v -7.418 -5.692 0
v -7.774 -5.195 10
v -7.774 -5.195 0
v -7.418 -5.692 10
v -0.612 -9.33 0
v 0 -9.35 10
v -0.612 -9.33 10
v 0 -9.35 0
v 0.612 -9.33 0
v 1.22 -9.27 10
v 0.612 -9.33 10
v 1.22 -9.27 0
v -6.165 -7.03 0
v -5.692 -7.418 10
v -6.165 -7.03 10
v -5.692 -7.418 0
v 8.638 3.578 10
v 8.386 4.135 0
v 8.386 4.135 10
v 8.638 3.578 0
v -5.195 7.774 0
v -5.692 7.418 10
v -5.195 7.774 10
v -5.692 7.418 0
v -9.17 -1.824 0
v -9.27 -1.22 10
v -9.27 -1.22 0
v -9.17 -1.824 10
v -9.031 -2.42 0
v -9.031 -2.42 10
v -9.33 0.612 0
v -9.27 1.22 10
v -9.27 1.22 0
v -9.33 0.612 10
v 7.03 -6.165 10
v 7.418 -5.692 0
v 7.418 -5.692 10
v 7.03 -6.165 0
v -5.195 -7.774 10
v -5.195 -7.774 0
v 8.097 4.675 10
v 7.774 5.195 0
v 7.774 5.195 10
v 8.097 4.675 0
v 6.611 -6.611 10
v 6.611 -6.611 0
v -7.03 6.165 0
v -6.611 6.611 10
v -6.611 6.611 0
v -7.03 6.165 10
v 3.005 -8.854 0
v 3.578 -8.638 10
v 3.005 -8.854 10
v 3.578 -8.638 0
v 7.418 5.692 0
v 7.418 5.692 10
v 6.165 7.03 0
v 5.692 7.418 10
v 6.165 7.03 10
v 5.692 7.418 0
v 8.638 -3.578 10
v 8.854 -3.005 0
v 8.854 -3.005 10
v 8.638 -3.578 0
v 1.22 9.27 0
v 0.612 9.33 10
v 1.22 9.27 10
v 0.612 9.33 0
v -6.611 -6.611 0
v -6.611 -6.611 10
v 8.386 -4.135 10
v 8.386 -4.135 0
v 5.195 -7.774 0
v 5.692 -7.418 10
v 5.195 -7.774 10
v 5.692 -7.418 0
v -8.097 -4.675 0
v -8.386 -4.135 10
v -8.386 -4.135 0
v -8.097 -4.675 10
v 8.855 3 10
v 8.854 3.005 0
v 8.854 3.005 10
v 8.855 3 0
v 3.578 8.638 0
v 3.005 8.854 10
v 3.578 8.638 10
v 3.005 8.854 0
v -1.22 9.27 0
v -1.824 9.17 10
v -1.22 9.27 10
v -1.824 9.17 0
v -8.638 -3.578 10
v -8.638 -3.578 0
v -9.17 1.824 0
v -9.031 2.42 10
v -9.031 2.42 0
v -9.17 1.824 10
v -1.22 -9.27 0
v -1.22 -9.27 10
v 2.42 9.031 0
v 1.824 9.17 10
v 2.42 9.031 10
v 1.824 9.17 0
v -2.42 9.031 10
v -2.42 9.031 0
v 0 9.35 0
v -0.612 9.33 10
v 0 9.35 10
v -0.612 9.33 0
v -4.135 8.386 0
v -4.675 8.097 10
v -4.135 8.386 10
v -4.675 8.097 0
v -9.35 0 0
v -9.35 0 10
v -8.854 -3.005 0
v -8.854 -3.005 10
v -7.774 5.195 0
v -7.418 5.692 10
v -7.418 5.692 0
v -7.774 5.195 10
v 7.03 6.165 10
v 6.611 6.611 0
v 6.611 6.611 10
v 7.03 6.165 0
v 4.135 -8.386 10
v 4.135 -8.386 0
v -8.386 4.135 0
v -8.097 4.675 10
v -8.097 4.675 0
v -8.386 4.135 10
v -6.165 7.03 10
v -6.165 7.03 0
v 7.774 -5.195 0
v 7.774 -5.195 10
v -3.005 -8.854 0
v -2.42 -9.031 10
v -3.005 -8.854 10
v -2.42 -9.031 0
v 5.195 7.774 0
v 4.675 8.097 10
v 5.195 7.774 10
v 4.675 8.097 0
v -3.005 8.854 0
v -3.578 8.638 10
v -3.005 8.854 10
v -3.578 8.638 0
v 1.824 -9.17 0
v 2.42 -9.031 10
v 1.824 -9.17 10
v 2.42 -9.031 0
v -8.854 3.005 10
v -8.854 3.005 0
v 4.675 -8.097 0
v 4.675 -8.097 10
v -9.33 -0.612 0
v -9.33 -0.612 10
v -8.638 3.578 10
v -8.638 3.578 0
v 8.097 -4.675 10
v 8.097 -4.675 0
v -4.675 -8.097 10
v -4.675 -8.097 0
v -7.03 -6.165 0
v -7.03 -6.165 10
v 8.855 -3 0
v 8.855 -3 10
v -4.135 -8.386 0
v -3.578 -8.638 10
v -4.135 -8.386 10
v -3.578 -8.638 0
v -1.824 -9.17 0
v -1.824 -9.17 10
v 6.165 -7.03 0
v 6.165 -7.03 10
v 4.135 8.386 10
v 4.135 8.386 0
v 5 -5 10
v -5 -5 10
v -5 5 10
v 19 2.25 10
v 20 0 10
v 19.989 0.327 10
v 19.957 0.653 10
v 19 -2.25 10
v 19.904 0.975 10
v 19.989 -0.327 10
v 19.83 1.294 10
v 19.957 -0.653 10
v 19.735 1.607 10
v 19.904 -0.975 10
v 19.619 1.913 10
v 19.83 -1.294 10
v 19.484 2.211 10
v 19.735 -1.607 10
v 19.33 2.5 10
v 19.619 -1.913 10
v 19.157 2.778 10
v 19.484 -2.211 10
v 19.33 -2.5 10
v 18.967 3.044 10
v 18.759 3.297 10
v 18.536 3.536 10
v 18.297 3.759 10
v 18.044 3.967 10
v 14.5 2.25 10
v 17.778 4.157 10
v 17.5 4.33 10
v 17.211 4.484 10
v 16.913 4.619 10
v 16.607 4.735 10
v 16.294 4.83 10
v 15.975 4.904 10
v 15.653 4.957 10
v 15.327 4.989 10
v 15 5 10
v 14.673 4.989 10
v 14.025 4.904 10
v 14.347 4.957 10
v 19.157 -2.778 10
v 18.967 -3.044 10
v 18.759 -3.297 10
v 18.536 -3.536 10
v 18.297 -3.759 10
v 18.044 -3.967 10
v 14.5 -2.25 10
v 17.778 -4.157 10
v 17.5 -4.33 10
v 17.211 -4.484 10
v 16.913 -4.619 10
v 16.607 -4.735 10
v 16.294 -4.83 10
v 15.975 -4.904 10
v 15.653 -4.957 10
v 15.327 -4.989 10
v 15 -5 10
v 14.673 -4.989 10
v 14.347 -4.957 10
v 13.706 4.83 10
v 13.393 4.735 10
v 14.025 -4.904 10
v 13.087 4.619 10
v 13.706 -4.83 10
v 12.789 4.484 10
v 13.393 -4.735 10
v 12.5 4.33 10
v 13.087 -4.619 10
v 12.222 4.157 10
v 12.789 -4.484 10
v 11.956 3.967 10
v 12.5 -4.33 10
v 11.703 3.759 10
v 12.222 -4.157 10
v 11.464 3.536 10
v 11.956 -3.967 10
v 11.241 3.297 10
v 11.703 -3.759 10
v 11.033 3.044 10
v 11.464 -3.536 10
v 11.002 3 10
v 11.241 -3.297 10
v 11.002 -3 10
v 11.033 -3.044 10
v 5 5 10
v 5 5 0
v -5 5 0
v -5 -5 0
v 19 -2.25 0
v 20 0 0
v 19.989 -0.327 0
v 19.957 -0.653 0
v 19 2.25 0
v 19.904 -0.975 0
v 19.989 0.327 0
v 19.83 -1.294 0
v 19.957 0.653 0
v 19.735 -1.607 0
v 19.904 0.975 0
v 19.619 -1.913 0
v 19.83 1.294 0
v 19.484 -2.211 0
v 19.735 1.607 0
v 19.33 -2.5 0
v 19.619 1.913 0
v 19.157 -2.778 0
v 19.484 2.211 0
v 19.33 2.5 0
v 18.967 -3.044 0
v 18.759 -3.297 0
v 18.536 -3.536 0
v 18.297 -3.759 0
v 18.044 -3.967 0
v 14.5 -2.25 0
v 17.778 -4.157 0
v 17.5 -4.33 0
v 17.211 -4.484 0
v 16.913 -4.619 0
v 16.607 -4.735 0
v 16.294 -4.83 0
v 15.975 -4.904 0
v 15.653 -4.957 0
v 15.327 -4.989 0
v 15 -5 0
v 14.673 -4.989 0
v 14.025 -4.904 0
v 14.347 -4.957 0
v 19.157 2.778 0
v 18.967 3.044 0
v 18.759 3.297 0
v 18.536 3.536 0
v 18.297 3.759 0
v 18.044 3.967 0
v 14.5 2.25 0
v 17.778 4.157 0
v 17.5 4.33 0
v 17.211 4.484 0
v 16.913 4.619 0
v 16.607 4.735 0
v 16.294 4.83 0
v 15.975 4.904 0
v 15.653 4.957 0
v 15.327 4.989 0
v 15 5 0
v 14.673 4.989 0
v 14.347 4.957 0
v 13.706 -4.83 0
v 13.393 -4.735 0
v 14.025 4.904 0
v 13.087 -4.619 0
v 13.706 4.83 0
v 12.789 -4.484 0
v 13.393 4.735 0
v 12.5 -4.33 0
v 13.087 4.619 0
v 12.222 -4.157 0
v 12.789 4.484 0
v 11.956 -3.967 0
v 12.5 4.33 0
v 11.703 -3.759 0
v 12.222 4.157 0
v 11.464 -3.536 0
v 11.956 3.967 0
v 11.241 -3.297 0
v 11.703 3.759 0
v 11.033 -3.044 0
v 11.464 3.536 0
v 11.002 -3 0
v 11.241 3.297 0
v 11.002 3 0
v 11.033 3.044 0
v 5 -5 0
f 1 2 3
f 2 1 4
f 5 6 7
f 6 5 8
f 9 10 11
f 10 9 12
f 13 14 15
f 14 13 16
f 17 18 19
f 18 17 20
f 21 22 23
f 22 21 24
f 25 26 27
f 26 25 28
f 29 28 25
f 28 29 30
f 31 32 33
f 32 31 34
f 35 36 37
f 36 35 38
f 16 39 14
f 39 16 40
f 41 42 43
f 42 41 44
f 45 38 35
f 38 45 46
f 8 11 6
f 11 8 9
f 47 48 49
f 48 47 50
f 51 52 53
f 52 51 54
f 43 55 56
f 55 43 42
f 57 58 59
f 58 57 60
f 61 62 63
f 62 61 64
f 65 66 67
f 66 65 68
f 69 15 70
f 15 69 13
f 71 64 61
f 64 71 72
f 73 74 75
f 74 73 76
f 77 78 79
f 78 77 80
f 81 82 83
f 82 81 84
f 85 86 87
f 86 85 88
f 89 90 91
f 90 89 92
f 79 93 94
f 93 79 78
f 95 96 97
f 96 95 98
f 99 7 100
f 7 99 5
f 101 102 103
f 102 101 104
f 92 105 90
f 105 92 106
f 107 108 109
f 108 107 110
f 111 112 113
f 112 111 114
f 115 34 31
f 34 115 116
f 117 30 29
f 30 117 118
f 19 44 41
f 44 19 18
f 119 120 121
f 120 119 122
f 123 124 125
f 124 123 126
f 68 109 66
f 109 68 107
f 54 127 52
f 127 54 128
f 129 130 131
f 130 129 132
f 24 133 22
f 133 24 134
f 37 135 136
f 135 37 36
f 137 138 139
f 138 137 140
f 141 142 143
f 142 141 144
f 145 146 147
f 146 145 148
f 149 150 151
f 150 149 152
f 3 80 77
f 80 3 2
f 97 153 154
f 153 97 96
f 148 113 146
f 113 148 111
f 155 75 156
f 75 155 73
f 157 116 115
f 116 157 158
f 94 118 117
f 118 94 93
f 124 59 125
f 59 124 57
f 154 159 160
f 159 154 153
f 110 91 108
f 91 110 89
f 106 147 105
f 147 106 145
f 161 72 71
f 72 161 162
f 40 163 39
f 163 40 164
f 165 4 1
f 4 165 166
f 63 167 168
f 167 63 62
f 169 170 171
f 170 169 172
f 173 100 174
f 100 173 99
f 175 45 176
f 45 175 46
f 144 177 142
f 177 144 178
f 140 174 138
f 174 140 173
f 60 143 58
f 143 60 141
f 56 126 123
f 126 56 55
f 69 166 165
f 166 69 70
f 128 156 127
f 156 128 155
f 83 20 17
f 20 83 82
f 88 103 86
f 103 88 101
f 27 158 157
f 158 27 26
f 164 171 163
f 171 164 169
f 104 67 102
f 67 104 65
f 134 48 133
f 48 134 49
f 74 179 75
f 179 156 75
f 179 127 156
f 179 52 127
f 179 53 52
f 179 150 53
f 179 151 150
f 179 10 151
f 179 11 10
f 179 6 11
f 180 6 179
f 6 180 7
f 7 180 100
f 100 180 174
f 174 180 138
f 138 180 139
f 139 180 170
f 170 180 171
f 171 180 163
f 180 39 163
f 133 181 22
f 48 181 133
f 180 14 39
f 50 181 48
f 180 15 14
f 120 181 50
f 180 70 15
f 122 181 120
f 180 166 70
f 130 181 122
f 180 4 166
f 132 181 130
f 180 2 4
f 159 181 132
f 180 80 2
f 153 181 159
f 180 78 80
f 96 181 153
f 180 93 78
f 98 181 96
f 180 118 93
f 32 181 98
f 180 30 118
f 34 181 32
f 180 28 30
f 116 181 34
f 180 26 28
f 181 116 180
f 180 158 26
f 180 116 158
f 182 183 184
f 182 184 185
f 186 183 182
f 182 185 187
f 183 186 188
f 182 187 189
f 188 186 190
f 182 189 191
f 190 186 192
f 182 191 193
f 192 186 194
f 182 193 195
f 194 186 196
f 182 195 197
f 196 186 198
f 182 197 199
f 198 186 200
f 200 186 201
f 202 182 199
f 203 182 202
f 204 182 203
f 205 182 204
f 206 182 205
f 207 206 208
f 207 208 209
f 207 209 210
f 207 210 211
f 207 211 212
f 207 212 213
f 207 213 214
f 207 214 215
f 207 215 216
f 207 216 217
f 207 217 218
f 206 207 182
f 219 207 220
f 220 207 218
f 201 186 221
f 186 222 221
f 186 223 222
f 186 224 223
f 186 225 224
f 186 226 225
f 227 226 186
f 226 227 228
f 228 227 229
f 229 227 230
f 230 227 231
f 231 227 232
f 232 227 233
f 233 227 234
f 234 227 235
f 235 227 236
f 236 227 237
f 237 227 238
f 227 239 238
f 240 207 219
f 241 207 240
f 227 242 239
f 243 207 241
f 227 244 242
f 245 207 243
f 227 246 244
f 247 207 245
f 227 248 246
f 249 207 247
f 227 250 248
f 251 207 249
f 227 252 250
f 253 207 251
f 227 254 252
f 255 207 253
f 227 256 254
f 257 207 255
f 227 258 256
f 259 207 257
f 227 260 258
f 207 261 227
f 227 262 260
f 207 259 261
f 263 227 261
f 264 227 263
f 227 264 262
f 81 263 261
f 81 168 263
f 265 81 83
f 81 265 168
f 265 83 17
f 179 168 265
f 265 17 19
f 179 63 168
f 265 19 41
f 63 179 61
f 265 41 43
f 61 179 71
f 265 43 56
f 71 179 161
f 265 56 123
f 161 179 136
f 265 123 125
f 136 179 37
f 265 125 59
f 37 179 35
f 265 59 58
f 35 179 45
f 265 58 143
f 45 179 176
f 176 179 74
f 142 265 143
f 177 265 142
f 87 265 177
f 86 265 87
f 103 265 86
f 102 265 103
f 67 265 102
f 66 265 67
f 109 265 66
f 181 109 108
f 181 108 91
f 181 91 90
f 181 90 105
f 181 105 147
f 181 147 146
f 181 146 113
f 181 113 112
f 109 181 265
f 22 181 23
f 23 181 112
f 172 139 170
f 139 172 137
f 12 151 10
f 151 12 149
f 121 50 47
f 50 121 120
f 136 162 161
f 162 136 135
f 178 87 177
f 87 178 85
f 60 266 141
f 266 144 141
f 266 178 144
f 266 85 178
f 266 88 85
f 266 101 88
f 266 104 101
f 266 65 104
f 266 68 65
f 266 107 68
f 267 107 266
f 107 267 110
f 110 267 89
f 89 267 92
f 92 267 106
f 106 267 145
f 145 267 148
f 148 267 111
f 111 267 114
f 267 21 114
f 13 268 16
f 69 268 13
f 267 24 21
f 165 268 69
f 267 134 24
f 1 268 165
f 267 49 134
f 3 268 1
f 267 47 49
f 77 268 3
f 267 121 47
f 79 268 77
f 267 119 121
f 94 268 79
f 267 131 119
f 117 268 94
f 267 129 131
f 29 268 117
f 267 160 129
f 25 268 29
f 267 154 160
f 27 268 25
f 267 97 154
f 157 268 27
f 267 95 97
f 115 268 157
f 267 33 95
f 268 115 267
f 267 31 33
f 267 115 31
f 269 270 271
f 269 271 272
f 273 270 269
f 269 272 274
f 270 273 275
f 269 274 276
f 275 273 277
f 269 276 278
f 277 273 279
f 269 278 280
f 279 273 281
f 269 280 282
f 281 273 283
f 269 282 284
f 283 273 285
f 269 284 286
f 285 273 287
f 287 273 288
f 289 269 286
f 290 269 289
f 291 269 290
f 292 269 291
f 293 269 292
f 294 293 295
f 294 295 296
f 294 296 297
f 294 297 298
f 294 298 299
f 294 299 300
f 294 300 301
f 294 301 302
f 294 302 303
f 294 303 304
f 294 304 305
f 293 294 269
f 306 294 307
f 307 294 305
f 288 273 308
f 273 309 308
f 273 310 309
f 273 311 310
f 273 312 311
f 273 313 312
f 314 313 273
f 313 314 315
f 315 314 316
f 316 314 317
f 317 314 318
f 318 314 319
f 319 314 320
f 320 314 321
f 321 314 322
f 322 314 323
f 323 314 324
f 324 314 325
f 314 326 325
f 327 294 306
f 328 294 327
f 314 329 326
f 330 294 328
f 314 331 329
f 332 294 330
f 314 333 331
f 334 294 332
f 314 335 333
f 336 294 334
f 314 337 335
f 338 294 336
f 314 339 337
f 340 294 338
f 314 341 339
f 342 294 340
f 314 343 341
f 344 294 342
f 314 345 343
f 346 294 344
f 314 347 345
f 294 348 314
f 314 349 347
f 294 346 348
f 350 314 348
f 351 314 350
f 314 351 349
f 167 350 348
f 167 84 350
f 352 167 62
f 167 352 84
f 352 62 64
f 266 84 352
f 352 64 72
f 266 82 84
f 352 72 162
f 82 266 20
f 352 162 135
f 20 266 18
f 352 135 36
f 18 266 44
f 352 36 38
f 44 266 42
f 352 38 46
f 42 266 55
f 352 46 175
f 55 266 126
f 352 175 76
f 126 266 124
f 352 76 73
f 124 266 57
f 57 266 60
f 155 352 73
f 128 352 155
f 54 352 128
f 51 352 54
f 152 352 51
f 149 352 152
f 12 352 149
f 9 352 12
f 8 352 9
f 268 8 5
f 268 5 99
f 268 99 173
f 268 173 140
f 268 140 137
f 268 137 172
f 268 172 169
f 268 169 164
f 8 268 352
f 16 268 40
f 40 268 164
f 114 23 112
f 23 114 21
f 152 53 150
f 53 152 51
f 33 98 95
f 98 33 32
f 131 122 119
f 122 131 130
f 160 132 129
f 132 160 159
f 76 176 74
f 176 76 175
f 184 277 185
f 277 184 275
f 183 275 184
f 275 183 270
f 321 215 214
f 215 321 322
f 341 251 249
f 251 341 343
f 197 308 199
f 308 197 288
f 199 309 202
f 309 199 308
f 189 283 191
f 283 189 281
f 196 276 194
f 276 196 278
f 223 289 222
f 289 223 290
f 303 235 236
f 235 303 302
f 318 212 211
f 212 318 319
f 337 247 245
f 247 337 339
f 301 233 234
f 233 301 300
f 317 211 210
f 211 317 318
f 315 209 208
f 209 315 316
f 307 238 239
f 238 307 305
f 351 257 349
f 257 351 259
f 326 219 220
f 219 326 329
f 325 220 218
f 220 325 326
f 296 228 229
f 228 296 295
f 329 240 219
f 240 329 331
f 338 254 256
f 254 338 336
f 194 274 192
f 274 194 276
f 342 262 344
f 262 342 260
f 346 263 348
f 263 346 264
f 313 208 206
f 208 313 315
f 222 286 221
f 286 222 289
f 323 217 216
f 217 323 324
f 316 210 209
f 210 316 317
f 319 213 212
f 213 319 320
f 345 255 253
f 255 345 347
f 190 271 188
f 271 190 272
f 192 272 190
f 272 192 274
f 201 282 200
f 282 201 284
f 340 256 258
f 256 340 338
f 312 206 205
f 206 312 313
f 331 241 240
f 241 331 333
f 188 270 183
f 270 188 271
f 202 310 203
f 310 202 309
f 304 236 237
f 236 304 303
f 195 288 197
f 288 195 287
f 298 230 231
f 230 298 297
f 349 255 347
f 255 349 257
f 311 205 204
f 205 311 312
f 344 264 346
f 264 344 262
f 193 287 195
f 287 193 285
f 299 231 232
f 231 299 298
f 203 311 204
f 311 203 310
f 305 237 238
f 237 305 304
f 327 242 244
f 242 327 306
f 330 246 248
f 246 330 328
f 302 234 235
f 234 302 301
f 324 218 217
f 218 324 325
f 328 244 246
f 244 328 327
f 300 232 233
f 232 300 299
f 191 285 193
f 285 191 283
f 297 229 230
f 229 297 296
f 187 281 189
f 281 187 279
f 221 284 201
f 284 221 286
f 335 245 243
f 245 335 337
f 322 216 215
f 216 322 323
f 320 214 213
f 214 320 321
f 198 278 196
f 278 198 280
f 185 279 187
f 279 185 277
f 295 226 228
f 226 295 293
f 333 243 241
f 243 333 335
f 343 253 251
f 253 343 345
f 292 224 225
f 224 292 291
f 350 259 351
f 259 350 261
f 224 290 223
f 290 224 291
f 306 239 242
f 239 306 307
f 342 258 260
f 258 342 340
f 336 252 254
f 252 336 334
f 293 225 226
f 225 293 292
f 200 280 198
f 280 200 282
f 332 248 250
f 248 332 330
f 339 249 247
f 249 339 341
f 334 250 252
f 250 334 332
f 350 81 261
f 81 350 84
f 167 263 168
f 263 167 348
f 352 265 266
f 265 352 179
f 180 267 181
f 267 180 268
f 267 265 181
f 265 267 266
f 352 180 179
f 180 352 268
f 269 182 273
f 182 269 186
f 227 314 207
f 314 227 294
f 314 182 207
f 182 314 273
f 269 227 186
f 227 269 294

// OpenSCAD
// Tubing clip for 12.7 mm (1/2 inch) lab stand rod
// Print orientation: flat, extruded along Z (z = 0 to 10)

// ---------------- Parameters ----------------
extrusion_height   = 10;   // Z height of the part (mm)
rod_d              = 12.7; // stand rod inner diameter (mm)
rod_wall           = 3;    // stand rod ring wall thickness (mm)
rod_opening_w      = 10;   // width of the -X side opening (mm)

tubing_d           = 6;    // tubing inner diameter (mm)
tubing_wall        = 2;    // tubing ring wall thickness (mm)
tubing_opening_w   = 4.5;  // width of the +X side opening (mm)

bridge_w           = 6;    // bridge width in Y (mm)
bridge_x_start     = 8;    // bridge start in X (mm)
bridge_x_end       = 12;   // bridge end in X (mm)

eps                = 0.5;  // cutter overshoot past faces (mm)
$fn                = 96;   // circle resolution

// ---------------- Derived ----------------
rod_outer = rod_d + 2 * rod_wall;                 // 18.7 mm
tubing_outer = tubing_d + 2 * tubing_wall;        // 10 mm
tubing_opening_half = tubing_opening_w / 2;       // 2.25 mm

// ---------------- Model ----------------
difference() {
    union() {
        // Rod ring
        cylinder(h = extrusion_height,
                  d = rod_outer,
                  $fn = $fn);
        // Tubing ring
        translate([15, 0, 0])
            cylinder(h = extrusion_height,
                     d = tubing_outer,
                     $fn = $fn);
        // Solid bridge
        translate([bridge_x_start, -bridge_w / 2, 0])
            cube([bridge_x_end - bridge_x_start, bridge_w, extrusion_height]);
    }

    // Opening in rod ring: x < 0 and -5 < y < 5
    translate([-rod_opening_w / 2, -5, -eps])
        cube([rod_opening_w, 10, extrusion_height + 2 * eps]);

    // Opening in tubing ring: x > 15 and -2.25 < y < 2.25
    translate([15 - eps, -tubing_opening_half, 0])
        cube([tubing_opening_w, tubing_opening_w, extrusion_height]);
}
